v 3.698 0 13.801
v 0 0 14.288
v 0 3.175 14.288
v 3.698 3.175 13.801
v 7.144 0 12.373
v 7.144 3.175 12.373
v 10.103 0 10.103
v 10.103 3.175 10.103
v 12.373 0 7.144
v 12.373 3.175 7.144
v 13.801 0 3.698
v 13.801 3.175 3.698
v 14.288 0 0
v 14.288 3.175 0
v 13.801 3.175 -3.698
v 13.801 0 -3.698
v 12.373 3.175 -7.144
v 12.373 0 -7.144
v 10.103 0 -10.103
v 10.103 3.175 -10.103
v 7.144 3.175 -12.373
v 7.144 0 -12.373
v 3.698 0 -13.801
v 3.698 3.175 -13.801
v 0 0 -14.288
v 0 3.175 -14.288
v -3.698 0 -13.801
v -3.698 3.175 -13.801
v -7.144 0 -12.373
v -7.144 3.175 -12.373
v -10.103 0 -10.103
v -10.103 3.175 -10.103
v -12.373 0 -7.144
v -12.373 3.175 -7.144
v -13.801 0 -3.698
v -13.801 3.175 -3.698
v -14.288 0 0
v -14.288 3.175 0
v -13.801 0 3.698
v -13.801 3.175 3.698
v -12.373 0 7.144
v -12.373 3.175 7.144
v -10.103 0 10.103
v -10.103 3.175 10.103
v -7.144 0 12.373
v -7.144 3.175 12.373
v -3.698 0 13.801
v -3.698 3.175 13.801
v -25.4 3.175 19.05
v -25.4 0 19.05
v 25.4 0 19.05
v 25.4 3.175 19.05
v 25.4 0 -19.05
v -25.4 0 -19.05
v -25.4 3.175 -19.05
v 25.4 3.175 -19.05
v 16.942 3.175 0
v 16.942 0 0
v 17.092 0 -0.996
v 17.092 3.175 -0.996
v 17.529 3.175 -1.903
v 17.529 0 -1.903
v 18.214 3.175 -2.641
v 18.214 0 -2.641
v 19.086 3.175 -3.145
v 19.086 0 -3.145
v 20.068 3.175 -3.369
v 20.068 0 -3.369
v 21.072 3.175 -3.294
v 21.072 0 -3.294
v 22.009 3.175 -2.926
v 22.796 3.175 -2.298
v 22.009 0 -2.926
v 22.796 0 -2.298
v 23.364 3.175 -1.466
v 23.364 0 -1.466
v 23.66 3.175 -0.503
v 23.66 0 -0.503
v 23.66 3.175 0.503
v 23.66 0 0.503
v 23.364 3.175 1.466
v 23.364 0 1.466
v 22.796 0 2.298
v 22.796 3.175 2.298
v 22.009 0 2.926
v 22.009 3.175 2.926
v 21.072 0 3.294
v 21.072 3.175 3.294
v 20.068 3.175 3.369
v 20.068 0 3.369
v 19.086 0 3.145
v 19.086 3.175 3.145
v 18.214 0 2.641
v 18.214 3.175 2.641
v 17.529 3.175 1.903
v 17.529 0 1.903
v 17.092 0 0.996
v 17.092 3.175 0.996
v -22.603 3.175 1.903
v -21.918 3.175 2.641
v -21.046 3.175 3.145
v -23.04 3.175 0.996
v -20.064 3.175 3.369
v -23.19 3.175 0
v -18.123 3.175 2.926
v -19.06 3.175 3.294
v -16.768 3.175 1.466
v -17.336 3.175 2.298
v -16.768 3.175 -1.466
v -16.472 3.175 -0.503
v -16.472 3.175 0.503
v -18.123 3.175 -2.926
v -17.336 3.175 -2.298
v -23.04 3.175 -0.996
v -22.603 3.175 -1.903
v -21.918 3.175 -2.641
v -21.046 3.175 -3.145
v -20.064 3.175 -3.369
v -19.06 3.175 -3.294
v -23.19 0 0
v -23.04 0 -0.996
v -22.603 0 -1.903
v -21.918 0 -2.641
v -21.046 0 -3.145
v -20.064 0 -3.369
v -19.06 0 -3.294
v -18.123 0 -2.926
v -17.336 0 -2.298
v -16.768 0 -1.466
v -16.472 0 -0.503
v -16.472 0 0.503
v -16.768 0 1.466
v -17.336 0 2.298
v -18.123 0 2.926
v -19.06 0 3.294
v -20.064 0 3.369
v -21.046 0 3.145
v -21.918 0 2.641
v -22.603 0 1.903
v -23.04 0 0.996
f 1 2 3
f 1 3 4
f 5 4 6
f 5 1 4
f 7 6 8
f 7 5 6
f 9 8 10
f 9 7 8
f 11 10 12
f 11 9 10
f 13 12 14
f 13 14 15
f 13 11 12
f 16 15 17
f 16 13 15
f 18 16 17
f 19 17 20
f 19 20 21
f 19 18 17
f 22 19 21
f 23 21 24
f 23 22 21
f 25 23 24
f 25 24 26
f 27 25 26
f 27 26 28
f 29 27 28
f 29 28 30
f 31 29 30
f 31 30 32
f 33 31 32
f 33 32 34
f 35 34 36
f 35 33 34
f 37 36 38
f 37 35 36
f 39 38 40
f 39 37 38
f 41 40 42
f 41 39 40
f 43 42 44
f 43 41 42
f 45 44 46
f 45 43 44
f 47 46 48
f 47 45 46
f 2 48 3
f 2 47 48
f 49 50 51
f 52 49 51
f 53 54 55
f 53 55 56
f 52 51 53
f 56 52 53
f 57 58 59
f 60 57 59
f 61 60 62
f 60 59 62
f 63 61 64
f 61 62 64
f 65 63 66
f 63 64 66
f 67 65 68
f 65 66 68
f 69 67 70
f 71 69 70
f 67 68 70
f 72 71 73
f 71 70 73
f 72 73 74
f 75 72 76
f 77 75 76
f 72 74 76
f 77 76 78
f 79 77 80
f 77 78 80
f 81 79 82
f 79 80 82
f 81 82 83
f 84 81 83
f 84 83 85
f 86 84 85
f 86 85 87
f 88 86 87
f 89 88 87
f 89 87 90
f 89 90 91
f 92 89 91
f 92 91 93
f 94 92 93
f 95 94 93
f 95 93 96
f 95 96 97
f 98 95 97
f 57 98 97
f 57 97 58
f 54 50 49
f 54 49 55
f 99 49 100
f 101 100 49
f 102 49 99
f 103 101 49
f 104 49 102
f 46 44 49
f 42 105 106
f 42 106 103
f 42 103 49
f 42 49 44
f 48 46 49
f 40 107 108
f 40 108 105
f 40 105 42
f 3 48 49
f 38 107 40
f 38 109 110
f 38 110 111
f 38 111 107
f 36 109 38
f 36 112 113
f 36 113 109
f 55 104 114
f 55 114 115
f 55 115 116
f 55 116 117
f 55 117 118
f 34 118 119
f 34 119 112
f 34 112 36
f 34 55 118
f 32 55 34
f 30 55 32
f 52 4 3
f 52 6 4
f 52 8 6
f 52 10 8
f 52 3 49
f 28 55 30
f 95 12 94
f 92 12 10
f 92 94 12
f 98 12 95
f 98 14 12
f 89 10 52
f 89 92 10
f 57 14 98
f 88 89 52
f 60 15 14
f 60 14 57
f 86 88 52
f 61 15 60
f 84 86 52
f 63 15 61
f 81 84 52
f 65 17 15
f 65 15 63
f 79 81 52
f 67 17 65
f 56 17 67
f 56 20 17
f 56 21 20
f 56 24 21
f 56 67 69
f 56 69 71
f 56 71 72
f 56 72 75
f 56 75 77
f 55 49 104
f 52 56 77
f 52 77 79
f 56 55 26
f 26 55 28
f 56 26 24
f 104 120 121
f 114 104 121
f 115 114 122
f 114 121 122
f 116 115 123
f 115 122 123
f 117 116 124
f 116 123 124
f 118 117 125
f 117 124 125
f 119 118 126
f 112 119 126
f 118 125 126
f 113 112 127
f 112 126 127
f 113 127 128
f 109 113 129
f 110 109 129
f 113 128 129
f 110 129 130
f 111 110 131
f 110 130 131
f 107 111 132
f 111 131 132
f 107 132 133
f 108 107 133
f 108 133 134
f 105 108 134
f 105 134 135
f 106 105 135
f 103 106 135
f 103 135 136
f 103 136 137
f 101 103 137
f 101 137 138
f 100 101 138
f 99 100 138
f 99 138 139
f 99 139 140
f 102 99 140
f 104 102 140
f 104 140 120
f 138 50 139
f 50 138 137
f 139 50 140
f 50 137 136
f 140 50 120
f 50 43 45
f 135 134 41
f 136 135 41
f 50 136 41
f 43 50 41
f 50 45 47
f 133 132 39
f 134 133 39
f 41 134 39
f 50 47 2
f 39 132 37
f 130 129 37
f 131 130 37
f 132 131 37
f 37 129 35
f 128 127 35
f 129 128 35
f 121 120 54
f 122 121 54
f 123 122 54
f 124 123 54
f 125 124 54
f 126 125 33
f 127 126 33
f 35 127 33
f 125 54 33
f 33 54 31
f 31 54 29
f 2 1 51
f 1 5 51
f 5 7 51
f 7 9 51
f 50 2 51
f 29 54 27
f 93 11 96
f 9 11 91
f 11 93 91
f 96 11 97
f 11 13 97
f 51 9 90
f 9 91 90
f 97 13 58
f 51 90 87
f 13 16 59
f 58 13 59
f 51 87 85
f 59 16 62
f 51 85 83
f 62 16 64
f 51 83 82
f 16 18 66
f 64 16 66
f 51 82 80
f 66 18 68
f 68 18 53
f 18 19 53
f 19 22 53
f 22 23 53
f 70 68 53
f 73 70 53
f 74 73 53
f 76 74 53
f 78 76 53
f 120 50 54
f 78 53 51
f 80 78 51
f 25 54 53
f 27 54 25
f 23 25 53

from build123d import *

# Parameters (mm, degrees)
SKETCH1_W               = 50.8
SKETCH1_H               = 38.1
SKETCH1_R               = 14.2875
BOSS_EXTRUDE1_DEPTH     = 3.175
F_1_4_CLEARANCE_HOLE1_D = 6.7564


with BuildPart() as part:
    # Sketch1 → Boss-Extrude1 (new body)
    with BuildSketch(Plane(origin=(0, 0, 0), x_dir=(1, 0, 0), z_dir=(0, 1, 0))):
        Rectangle(SKETCH1_W, SKETCH1_H)
        with Locations(Location((0, 0, 0), (0, 0, 270))):
            Circle(SKETCH1_R, mode=Mode.SUBTRACT)
    extrude(amount=BOSS_EXTRUDE1_DEPTH)

    # 1/4 Clearance Hole1 (through all)
    with Locations(Plane(origin=(0, 3.175, 0), x_dir=(1, 0, 0), z_dir=(0, 1, 0))):
        with Locations((20.32, 0), (-19.812, 0)):
            Hole(F_1_4_CLEARANCE_HOLE1_D / 2)


solid = part.part
